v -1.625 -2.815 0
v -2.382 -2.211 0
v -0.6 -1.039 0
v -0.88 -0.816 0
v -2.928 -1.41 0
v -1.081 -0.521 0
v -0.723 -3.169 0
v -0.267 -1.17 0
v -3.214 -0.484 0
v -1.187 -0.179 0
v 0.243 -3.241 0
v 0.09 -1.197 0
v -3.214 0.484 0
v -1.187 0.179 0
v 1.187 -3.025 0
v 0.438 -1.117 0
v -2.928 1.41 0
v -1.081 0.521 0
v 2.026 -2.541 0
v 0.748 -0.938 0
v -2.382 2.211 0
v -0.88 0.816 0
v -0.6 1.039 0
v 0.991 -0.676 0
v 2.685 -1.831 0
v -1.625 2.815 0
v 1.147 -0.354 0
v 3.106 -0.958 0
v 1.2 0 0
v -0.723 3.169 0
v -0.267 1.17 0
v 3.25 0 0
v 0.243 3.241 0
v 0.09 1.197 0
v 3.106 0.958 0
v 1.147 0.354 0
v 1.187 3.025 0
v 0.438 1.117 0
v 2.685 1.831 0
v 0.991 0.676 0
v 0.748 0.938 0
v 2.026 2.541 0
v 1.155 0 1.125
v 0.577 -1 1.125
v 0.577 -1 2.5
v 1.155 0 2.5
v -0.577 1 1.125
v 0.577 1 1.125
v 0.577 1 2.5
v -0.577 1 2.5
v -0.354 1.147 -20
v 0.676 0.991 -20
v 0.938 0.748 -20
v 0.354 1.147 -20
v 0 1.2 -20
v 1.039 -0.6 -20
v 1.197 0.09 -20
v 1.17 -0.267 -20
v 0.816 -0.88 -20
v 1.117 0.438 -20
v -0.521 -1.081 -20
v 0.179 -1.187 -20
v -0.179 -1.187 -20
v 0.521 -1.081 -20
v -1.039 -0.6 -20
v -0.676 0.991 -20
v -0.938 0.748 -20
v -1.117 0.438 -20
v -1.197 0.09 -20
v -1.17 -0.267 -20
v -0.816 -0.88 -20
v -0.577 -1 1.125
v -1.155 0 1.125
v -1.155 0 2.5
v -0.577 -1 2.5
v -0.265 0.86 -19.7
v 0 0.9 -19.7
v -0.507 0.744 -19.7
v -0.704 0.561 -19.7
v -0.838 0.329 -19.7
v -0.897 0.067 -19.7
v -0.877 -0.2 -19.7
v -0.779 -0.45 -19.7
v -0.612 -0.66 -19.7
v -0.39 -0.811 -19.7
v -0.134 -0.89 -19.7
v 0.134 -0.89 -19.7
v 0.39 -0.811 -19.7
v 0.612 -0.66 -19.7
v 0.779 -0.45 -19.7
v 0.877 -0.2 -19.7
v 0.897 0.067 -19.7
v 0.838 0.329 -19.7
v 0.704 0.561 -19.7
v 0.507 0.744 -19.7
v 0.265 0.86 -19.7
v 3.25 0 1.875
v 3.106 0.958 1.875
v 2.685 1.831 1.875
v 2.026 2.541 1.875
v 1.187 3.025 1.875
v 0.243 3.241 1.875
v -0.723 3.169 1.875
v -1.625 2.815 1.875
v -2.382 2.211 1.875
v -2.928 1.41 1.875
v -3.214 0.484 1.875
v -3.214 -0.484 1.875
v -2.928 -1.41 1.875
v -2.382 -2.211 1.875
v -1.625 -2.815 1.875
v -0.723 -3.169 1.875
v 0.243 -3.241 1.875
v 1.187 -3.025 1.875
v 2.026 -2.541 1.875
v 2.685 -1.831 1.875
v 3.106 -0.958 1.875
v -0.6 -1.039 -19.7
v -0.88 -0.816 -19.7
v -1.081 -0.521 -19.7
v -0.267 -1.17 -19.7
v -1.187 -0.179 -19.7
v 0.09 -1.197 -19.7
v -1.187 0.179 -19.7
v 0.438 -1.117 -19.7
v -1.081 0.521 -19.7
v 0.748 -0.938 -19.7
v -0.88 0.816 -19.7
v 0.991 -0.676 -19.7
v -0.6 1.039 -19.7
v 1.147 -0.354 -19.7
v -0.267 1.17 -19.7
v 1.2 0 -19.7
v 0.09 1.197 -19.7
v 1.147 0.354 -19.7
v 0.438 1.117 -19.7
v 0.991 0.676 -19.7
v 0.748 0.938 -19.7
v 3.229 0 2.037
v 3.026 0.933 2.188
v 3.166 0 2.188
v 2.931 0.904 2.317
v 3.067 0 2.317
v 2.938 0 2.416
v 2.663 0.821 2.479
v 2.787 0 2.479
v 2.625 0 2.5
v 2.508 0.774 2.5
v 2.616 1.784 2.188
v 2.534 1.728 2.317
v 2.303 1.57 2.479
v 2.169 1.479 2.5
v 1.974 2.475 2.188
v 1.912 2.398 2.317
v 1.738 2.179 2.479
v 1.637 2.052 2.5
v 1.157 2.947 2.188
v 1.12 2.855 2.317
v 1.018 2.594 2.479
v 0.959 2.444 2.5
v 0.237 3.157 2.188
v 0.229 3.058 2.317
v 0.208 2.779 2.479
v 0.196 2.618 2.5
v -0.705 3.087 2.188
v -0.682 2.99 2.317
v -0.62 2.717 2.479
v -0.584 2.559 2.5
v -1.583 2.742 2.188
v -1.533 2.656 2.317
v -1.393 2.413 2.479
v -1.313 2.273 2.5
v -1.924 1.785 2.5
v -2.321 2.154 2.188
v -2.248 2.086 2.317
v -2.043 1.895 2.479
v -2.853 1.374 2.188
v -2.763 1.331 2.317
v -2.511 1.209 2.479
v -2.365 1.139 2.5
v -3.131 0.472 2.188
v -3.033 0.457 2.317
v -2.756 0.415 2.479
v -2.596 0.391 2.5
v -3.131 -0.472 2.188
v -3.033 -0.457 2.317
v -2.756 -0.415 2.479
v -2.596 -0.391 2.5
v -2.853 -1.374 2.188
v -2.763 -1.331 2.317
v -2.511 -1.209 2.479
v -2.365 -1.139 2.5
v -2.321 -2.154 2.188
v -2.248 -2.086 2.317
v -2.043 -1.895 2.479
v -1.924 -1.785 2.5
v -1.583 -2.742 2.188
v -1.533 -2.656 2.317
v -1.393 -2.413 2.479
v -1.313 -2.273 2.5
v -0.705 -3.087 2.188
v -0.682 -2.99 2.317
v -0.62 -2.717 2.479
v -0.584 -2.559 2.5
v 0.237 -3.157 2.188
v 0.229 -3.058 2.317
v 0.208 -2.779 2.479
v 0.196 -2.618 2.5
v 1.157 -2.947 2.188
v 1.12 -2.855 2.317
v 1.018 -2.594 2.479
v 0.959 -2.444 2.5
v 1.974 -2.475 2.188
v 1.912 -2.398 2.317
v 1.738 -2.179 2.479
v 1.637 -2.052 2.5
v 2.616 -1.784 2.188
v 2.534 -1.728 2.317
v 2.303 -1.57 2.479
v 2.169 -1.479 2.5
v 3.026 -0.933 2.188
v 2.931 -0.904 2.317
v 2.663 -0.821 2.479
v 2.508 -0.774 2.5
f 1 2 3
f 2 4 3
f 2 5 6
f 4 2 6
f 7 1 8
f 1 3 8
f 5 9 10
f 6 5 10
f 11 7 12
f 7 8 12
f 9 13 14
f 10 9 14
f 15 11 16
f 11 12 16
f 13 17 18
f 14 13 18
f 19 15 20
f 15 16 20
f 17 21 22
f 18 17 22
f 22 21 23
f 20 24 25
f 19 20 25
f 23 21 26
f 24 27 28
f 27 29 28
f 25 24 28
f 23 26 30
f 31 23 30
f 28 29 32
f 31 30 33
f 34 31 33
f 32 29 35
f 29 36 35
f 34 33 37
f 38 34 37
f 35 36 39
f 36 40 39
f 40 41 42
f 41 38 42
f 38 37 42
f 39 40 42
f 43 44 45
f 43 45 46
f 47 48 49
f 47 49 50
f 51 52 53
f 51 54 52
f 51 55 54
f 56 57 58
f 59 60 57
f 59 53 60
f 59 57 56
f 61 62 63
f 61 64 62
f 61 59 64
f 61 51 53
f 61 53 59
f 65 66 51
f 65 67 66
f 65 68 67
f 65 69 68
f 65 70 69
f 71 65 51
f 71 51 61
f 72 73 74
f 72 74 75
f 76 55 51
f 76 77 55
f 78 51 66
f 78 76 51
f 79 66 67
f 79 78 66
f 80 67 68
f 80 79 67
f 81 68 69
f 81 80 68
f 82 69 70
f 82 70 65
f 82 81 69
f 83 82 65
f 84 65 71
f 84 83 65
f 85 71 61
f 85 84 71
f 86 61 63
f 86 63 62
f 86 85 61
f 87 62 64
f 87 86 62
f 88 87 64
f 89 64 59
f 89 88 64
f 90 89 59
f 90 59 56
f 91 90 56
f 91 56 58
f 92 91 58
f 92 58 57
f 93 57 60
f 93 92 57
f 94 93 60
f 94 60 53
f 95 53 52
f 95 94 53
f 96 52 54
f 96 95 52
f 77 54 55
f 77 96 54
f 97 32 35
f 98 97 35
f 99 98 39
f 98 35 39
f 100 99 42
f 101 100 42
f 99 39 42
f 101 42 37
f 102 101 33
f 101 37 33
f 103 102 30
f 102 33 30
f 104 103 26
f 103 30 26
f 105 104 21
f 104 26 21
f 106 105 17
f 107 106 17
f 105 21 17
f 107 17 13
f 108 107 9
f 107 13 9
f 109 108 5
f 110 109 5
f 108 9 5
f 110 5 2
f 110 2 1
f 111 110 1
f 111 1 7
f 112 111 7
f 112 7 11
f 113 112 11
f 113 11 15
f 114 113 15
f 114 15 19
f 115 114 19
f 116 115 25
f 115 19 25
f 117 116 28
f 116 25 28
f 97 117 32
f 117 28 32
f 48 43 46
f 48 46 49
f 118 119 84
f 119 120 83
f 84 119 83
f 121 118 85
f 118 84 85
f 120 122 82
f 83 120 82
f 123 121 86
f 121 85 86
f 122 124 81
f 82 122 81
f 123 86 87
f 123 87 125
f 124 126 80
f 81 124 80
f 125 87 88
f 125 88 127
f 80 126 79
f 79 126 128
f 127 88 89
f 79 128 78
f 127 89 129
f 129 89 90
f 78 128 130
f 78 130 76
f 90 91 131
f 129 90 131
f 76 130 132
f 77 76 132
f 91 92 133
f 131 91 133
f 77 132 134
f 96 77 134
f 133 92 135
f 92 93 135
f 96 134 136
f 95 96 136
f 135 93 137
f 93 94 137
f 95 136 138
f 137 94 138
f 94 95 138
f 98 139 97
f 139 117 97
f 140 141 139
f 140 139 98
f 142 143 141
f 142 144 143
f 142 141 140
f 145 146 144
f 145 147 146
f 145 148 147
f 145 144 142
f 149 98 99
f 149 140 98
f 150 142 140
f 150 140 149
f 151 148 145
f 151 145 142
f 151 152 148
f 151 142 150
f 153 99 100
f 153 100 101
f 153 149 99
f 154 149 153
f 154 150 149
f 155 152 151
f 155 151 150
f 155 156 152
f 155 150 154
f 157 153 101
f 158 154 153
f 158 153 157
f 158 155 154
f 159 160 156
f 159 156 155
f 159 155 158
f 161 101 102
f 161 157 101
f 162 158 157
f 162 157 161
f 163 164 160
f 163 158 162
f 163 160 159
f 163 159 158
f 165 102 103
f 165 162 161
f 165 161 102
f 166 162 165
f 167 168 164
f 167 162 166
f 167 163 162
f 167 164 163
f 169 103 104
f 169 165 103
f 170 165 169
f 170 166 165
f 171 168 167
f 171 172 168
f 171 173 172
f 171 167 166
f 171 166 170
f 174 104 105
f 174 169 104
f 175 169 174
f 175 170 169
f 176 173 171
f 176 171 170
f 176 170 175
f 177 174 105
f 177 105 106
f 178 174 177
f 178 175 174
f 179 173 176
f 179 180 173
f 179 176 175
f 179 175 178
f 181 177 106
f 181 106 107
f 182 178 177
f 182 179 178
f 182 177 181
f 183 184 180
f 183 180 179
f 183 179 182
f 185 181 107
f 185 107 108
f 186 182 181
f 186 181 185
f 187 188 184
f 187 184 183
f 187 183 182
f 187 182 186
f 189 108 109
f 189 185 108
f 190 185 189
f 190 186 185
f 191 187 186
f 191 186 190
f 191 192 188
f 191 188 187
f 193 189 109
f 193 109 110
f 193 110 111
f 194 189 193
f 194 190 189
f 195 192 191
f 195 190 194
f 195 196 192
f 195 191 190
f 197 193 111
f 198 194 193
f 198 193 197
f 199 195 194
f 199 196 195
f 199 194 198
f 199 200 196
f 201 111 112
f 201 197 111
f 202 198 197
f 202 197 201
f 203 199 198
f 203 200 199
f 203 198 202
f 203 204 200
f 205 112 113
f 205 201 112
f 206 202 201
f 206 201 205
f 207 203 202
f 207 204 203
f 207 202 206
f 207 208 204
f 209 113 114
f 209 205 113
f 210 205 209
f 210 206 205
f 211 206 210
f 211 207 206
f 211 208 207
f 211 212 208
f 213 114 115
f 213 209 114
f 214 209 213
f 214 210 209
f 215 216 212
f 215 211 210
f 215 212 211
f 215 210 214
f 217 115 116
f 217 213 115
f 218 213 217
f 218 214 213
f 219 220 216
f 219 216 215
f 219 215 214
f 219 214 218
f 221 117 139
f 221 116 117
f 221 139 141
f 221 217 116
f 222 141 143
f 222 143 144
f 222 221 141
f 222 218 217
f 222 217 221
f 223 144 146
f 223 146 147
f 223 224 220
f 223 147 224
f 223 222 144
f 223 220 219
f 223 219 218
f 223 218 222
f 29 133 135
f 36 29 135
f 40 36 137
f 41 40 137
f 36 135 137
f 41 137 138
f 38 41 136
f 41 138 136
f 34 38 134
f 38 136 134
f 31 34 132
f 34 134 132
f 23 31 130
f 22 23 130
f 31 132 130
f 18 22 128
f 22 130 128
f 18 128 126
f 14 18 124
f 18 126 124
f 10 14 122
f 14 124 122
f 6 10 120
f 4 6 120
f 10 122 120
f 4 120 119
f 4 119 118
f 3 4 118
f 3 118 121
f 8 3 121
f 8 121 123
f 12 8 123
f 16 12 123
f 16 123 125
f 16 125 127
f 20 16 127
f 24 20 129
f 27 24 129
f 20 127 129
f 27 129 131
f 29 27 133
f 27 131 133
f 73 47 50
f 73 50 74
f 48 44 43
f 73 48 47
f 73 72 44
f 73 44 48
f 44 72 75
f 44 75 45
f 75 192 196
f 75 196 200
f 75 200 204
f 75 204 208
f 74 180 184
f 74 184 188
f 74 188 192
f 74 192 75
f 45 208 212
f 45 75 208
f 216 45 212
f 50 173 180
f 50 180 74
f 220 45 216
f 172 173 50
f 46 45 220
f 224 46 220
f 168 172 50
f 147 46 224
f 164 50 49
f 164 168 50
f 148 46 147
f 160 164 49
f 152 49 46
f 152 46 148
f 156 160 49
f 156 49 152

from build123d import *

# Parameters (mm, degrees)
F_0090_CYLINDER_SKETCH_R    = 3.25
F_0090_CYLINDER_DEPTH       = 2.5
F_0091_FILLET_R             = 0.625
F_0092_EXTRUDE_DEPTH        = 1.385
F_0092_EXTRUDE_ROTATE_ANGLE = 120
F_0095_CYLINDER_SKETCH_R    = 1.2
F_0095_CYLINDER_DEPTH       = 19.7
F_0096_CONE_ROTATE_ANGLE    = 90


with BuildPart() as part:
    # 0090_cylinder_Sketch → 0090_cylinder (new body)
    with BuildSketch(Plane.XY):
        Circle(F_0090_CYLINDER_SKETCH_R)
    extrude(amount=F_0090_CYLINDER_DEPTH)

    # 0091_fillet
    f_0091_fillet_edges = [part.edges().sort_by_distance(p)[0] for p in [
        (-3.25, 0, 2.5),
    ]]
    fillet(f_0091_fillet_edges, radius=F_0091_FILLET_R)


with BuildPart() as body_2:
    # 0092_extrude_Sketch → 0092_extrude (new body)
    with BuildSketch(Plane.XY):
        Polygon((0, 0), (1.154700538, 0), (1.732050808, 1), (1.154700538, 2), (0, 2), (-0.577350269, 1), align=None)
    extrude(amount=F_0092_EXTRUDE_DEPTH)


with BuildPart() as body_2_1:
    # 0092_extrude_Rotate: read off the stored shape, not the designer's step
    # 0092_extrude_Rotate: moved
    add(body_2.part.rotate(Axis((0, 0, 0), (0, 0, 1)), F_0092_EXTRUDE_ROTATE_ANGLE))


with BuildPart() as body_2_2:
    # 0092_extrude_Translate: moved
    add(body_2_1.part.moved(Location((1.154700538, 0, 1.125))))


with BuildPart() as part_1:
    add(part.part)

    # 0094_sub: cut body 2
    add(body_2_2.part, mode=Mode.SUBTRACT)


with BuildPart() as body_2_2_1:
    # 0095_cylinder_Sketch → 0095_cylinder (new body)
    with BuildSketch(Plane.XY):
        Circle(F_0095_CYLINDER_SKETCH_R)
    extrude(amount=F_0095_CYLINDER_DEPTH)


with BuildPart() as body_2_2_2:
    # 0095_cylinder_Translate: moved
    add(body_2_2_1.part.moved(Location((0, 0, -19.7))))


with BuildPart() as body_3:
    # 0096_cone_Sketch → 0096_cone (revolve)
    with BuildSketch(Plane.XY, mode=Mode.PRIVATE) as f_0096_cone_sk:
        Polygon((0, 0), (1.2, 0), (0.9, 0.3), (0, 0.3), align=None)
    revolve(f_0096_cone_sk.sketch.rotate(Axis((0, -100, 0), (0, 1, 0)), 90), axis=Axis((0, -100, 0), (0, 1, 0)))


with BuildPart() as body_3_1:
    # 0096_cone_Rotate: moved
    add(body_3.part.rotate(Axis((0, 0, 0), (1, 0, 0)), F_0096_CONE_ROTATE_ANGLE))


with BuildPart() as body_3_2:
    # 0096_cone_Translate: moved
    add(body_3_1.part.moved(Location((0, 0, -20))))


with BuildPart() as body_2_2_3:
    add(body_2_2_2.part)

    # 0098_add: union body 3
    add(body_3_2.part)


with BuildPart() as part_2:
    add(part_1.part)

    # 0099_add: union body 2 2
    add(body_2_2_3.part)


solid = part_2.part
